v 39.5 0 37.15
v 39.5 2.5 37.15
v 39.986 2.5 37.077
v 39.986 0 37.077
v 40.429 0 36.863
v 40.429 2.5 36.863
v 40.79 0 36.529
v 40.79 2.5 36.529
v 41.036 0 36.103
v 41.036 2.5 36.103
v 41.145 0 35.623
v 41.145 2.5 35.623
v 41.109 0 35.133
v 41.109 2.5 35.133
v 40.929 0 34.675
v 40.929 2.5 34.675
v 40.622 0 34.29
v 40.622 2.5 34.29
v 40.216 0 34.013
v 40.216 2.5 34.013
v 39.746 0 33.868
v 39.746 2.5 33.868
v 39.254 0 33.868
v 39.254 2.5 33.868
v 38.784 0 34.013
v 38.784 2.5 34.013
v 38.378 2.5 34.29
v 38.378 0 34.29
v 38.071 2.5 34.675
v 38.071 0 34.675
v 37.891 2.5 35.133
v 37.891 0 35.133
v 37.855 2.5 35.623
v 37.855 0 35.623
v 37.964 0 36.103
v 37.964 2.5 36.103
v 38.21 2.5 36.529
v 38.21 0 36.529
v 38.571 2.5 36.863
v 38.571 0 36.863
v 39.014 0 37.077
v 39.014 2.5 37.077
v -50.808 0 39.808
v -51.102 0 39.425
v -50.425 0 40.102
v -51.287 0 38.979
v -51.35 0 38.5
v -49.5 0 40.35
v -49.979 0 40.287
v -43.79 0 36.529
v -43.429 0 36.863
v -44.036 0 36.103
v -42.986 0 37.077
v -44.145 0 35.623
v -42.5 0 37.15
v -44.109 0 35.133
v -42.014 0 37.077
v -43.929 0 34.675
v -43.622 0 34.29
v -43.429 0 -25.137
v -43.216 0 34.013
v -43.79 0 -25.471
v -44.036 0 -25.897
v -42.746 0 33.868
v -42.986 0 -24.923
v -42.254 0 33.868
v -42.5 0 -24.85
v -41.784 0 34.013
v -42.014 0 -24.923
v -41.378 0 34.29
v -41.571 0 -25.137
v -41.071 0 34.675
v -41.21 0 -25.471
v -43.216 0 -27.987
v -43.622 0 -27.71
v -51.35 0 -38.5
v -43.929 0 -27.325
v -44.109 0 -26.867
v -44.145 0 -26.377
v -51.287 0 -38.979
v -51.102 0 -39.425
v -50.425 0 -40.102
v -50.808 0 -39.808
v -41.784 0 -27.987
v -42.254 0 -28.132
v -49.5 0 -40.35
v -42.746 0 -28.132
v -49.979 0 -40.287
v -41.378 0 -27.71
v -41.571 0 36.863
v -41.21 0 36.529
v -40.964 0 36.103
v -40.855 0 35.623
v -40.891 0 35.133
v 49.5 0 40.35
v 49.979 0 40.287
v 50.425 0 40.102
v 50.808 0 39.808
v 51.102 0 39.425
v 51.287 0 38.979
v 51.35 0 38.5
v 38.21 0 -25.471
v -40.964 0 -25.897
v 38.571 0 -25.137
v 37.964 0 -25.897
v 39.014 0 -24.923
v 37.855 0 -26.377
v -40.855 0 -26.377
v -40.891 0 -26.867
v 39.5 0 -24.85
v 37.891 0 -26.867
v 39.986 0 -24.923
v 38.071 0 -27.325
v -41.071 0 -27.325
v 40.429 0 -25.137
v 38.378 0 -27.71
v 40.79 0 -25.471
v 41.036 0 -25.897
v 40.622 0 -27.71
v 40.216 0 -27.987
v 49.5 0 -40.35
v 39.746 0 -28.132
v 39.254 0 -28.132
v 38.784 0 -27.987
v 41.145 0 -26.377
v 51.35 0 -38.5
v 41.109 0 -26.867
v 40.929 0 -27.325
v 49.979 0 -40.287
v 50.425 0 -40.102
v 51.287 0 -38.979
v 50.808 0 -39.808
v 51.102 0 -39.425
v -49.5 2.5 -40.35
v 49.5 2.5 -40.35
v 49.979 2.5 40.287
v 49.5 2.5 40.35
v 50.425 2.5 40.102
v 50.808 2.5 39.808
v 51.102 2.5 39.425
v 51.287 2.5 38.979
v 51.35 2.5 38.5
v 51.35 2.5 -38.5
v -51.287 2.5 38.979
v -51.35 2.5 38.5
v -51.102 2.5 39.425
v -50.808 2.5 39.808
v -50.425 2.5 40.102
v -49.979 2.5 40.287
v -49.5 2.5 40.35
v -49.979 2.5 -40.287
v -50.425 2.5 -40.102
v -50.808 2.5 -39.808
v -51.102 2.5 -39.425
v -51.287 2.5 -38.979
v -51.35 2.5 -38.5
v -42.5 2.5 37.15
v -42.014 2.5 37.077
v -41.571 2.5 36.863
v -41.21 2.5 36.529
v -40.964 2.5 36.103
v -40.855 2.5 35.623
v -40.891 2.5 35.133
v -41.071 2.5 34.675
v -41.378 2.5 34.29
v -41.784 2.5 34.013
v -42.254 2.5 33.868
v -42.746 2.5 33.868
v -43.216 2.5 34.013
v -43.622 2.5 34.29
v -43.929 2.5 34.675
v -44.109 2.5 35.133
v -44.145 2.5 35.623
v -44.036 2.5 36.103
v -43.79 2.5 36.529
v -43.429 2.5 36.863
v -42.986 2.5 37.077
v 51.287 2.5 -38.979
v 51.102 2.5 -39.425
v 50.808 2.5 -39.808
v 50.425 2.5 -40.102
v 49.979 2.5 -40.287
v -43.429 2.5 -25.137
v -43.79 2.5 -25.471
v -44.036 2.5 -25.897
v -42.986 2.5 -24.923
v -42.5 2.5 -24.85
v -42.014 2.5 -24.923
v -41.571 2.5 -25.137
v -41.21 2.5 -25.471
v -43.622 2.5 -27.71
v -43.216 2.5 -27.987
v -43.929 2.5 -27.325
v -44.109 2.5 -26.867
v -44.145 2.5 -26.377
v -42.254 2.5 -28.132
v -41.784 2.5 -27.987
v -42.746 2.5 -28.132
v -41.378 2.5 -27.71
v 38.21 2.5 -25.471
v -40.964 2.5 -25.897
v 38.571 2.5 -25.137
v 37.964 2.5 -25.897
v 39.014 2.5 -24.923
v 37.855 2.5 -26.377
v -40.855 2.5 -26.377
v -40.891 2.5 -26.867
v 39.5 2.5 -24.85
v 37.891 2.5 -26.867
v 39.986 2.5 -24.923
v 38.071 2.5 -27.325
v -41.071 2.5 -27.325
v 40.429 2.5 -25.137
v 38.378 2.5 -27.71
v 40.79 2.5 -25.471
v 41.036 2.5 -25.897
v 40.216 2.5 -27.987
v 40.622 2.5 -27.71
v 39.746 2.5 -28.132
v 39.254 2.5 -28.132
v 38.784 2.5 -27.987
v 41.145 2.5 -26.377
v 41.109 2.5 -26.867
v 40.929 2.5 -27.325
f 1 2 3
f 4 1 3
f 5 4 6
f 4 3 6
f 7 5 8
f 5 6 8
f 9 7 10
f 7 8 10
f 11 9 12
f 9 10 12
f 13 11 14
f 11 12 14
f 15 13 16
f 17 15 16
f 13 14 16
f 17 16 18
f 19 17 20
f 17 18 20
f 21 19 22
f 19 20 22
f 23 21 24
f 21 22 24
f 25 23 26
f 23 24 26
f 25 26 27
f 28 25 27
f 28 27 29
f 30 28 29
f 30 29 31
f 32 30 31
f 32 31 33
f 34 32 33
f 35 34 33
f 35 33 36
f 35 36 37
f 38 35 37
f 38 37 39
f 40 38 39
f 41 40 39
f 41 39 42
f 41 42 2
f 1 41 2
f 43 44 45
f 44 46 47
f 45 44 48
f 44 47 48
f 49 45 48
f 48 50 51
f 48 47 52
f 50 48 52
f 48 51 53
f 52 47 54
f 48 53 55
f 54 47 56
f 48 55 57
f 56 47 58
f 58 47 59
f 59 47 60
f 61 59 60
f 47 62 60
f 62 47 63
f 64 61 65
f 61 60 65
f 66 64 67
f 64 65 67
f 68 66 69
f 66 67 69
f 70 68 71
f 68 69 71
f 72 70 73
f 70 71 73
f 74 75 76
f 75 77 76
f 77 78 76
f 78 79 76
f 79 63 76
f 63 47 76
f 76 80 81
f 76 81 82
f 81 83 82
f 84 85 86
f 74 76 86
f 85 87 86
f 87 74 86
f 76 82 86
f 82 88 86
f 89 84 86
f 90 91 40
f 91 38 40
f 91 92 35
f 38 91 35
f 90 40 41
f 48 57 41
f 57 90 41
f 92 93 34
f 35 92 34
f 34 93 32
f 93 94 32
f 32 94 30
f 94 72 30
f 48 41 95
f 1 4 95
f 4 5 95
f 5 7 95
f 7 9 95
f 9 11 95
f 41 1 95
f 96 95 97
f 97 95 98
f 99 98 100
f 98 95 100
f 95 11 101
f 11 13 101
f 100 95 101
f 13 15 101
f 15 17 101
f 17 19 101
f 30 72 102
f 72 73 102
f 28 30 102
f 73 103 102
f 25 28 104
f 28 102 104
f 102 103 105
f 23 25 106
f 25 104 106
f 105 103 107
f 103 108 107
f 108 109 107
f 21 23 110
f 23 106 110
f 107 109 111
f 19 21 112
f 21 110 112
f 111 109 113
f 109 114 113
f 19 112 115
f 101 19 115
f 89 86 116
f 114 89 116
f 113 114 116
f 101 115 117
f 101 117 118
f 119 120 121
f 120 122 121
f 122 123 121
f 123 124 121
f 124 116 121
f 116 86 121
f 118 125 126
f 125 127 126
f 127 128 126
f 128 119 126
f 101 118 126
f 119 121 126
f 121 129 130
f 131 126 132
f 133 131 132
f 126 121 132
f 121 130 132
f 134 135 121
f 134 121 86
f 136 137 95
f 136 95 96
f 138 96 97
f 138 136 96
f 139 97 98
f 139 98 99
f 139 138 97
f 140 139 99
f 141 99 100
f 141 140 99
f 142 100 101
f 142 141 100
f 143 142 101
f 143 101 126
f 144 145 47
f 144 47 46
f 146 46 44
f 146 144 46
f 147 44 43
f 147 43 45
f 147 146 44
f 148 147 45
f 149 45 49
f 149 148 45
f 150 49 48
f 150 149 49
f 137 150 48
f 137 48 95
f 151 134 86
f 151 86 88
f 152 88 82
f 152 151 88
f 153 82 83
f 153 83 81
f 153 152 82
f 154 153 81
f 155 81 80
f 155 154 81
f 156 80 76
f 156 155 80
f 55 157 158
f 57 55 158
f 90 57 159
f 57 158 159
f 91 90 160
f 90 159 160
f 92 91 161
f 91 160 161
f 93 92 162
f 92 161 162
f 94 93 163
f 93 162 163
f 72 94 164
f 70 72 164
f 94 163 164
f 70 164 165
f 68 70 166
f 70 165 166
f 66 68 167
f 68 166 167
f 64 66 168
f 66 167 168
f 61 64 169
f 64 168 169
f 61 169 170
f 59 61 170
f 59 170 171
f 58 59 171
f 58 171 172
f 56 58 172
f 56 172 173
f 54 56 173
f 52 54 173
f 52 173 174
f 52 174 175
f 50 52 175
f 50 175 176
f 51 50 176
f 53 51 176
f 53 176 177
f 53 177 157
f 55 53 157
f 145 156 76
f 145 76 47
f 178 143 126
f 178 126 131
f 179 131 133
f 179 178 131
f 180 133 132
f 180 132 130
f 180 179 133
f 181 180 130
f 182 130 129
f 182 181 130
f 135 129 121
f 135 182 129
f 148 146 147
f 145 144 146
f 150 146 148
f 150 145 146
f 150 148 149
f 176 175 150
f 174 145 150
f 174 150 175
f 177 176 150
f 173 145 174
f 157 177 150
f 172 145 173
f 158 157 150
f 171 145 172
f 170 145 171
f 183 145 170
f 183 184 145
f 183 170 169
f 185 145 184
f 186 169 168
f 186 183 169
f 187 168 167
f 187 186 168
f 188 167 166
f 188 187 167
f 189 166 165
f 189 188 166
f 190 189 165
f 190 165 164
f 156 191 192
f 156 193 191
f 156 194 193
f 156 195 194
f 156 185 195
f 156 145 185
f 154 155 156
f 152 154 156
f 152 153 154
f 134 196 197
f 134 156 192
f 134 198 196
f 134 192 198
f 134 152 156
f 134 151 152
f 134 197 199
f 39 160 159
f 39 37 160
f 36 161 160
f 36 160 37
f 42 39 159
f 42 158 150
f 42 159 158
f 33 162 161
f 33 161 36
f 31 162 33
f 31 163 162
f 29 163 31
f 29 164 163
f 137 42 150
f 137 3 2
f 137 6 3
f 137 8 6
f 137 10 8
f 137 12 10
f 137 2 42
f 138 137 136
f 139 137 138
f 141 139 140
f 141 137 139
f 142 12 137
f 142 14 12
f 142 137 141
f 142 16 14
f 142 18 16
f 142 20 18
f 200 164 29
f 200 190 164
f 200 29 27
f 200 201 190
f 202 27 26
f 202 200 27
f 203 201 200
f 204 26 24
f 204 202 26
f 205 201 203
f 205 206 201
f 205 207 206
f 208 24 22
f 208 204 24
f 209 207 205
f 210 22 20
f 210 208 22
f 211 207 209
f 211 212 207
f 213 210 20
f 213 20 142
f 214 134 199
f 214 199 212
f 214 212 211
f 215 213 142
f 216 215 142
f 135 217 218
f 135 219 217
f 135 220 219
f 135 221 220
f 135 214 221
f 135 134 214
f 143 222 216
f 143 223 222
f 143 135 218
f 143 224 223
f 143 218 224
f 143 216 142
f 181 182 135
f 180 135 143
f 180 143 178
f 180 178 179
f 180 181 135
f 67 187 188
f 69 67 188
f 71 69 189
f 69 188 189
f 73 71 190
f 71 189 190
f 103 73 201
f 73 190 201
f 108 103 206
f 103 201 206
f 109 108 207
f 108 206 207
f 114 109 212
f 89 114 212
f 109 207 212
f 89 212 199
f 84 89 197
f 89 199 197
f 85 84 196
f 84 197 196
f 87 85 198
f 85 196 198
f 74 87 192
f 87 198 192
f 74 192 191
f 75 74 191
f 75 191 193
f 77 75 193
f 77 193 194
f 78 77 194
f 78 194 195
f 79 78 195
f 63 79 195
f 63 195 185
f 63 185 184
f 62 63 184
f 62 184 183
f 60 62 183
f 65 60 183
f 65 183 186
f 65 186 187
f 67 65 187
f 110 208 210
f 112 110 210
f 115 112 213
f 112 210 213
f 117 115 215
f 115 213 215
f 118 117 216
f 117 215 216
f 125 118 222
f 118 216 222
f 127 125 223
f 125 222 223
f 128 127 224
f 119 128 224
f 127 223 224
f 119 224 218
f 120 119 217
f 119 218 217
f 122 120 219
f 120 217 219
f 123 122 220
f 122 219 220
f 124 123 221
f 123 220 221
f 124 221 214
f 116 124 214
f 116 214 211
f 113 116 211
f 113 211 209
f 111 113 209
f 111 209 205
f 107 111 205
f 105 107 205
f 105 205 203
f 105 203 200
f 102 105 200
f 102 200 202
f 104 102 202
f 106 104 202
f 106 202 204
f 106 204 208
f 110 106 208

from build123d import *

# Parameters (mm, degrees)
SKETCH_1_W          = 103
SKETCH_1_H          = 81
EXTRUDE_1_DEPTH     = 2.5
FILLET_1_R          = 2
SKETCH_2_R          = 1.65
CUT_EXTRUDE_1_DEPTH = 66.56485339
CUT_EXTRUDE_2_DEPTH = 66.56485339


with BuildPart() as part:
    # 草图1 → 凸台-拉伸1 (new body)
    with BuildSketch(Plane(origin=(0, 0, 0), x_dir=(1, 0, 0), z_dir=(0, 1, 0))):
        Rectangle(SKETCH_1_W, SKETCH_1_H)
    extrude(amount=EXTRUDE_1_DEPTH)

    # 圆角1
    fillet_1_edges = [part.edges().sort_by_distance(p)[0] for p in [
        (51.5, 1.25, 40.5),
        (-51.5, 1.25, 40.5),
        (-51.5, 1.25, -40.5),
        (51.5, 1.25, -40.5),
    ]]
    fillet(fillet_1_edges, radius=FILLET_1_R)

    # 草图2 → 切除-拉伸1 (cut, through all)
    with BuildSketch(Plane(origin=(0, 2.5, 0), x_dir=(1, 0, 0), z_dir=(0, 1, 0))):
        with Locations(Location((-42.5, 26.5, 0), (0, 0, 270))):
            Circle(SKETCH_2_R)
        with Locations(Location((39.5, 26.5, 0), (0, 0, 270))):
            Circle(SKETCH_2_R)
        with Locations(Location((39.5, -35.5, 0), (0, 0, 270))):
            Circle(SKETCH_2_R)
        with Locations(Location((-42.5, -35.5, 0), (0, 0, 270))):
            Circle(SKETCH_2_R)
    extrude(amount=-CUT_EXTRUDE_1_DEPTH, mode=Mode.SUBTRACT)

    # 草图3 → 切除-拉伸2 (cut, through all)
    with BuildSketch(Plane(origin=(0, 2.5, 0), x_dir=(1, 0, 0), z_dir=(0, 1, 0))):
        with BuildLine():
            Line((49.5, 40.5), (-49.5, 40.5))
            ThreePointArc((-49.5, 40.5), (-50.914213562, 39.914213562), (-51.5, 38.5))
            Line((-51.5, 38.5), (-51.5, -38.5))
            ThreePointArc((-51.5, -38.5), (-50.914213562, -39.914213562), (-49.5, -40.5))
            Line((-49.5, -40.5), (49.5, -40.5))
            ThreePointArc((49.5, -40.5), (50.914213562, -39.914213562), (51.5, -38.5))
            Line((51.5, -38.5), (51.5, 38.5))
            ThreePointArc((51.5, 38.5), (50.914213562, 39.914213562), (49.5, 40.5))
        make_face()
        with BuildLine():
            Line((49.5, 40.35), (-49.5, 40.35))
            ThreePointArc((-49.5, 40.35), (-50.808147545, 39.808147545), (-51.35, 38.5))
            Line((-51.35, 38.5), (-51.35, -38.5))
            ThreePointArc((-51.35, -38.5), (-50.808147545, -39.808147545), (-49.5, -40.35))
            Line((-49.5, -40.35), (49.5, -40.35))
            ThreePointArc((49.5, -40.35), (50.808147545, -39.808147545), (51.35, -38.5))
            Line((51.35, -38.5), (51.35, 38.5))
            ThreePointArc((51.35, 38.5), (50.808147545, 39.808147545), (49.5, 40.35))
        make_face(mode=Mode.SUBTRACT)
    extrude(amount=-CUT_EXTRUDE_2_DEPTH, mode=Mode.SUBTRACT)


solid = part.part
